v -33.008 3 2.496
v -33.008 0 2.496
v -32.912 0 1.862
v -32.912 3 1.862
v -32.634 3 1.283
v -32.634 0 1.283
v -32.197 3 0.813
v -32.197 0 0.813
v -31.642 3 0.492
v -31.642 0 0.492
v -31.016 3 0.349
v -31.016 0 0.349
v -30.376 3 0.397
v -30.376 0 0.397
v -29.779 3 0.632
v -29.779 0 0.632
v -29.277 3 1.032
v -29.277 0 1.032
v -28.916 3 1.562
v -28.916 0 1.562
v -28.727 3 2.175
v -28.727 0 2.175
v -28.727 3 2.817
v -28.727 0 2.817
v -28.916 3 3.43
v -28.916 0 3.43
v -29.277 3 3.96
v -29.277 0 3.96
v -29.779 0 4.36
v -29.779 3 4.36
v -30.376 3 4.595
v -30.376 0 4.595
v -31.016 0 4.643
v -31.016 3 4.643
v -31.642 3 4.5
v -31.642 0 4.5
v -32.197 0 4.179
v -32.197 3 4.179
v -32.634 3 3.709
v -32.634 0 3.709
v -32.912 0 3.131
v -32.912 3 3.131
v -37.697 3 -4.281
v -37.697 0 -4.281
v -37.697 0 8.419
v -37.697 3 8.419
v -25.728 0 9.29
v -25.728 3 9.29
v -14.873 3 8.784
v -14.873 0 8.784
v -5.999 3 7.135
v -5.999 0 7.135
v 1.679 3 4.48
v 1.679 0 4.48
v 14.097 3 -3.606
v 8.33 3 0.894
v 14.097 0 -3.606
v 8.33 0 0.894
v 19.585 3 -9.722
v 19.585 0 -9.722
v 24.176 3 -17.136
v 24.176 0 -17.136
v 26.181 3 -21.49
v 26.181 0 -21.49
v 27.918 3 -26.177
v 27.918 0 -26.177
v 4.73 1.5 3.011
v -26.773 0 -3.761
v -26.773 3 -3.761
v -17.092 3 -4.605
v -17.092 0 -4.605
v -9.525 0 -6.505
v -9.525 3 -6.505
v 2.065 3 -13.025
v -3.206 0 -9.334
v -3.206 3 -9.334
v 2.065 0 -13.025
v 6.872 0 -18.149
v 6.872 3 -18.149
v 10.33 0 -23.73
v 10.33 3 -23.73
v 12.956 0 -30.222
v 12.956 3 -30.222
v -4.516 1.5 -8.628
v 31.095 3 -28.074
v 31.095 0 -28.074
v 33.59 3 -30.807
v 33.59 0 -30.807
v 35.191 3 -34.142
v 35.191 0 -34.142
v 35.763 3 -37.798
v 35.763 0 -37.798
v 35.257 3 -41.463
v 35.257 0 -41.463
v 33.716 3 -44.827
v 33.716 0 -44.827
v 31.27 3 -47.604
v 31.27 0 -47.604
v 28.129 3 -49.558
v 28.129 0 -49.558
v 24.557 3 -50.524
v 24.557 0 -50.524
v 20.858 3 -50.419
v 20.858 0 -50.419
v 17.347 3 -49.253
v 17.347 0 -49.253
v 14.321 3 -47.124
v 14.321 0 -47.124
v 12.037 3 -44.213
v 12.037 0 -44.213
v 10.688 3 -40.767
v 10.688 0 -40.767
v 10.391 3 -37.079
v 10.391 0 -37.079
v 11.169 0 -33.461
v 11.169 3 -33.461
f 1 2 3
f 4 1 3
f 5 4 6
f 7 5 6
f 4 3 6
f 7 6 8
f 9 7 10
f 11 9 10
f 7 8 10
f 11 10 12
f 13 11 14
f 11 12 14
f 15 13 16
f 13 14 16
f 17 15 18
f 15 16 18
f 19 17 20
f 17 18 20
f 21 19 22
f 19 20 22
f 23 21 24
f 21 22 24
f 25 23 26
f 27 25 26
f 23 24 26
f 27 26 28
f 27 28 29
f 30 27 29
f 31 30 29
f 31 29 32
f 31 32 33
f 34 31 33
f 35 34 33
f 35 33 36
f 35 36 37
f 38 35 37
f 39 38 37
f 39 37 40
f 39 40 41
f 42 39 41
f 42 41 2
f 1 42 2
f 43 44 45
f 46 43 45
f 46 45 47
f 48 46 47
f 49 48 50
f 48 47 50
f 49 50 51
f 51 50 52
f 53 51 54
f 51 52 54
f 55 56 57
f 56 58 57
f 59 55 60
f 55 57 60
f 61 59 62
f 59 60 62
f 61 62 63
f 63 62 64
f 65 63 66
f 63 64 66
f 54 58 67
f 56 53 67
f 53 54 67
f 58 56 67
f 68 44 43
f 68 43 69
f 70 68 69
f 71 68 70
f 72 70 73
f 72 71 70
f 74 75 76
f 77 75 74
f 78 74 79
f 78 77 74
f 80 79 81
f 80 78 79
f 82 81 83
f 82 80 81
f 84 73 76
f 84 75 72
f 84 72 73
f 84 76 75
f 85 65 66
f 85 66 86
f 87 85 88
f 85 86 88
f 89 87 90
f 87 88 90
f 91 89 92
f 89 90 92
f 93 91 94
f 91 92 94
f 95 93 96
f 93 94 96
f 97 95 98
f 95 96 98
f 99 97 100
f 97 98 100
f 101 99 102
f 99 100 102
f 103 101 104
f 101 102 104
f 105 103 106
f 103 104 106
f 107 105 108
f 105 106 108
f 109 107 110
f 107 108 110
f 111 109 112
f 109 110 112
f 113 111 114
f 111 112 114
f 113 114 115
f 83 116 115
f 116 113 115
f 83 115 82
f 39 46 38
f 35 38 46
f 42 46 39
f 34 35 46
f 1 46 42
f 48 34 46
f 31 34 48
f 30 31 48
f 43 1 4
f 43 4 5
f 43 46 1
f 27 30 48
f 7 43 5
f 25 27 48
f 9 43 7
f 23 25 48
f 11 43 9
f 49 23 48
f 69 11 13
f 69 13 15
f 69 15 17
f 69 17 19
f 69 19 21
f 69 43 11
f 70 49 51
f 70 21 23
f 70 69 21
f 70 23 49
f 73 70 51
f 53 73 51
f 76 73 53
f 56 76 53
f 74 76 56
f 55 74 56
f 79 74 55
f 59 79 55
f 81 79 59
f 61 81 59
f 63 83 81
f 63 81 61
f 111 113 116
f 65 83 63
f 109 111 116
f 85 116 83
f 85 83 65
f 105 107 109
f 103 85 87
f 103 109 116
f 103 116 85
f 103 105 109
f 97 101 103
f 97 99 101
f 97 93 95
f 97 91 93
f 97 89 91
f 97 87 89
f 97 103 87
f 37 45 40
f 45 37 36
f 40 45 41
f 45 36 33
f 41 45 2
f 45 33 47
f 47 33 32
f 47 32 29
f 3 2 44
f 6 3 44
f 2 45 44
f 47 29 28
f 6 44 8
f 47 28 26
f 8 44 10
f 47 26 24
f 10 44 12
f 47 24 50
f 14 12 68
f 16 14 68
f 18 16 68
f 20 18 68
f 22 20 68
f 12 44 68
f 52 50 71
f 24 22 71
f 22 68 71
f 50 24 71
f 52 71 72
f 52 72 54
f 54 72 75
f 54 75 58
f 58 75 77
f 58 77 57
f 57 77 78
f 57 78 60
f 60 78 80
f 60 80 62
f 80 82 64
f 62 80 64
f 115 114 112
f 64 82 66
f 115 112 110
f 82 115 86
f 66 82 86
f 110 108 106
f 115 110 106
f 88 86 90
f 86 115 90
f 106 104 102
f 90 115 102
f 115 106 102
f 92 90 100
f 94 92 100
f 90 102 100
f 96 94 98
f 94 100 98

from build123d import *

# Parameters (mm, degrees)
BOSS_EXTRUDE1_DEPTH   = 3
SKETCH3_R             = 12.7
BOSS_EXTRUDE2_DEPTH   = 3
F_8_CLEARANCE_HOLE1_D = 4.3053


with BuildPart() as part:
    # Sketch2 → Boss-Extrude1 (new body)
    with BuildSketch(Plane(origin=(0, 0, 0), x_dir=(1, 0, 0), z_dir=(0, 1, 0))):
        with BuildLine():
            Line((-37.697043062, 4.281020581), (-37.697043062, -8.418979419))
            add(Edge.make_bspline(
                [(-37.697043062, -8.418979419), (17.380898097, -15.277400847), (29.368687451, 31.123681561)],
                knots=[0, 0, 0, 1, 1, 1], degree=2))
            Line((29.368687451, 31.123681561), (14.247453118, 35.062826639))
            add(Edge.make_bspline(
                [(-37.697043062, 4.281020581), (6.487978336, -0.323288205), (14.247453118, 35.062826639)],
                knots=[0, 0, 0, 1, 1, 1], degree=2))
        make_face()
    extrude(amount=BOSS_EXTRUDE1_DEPTH)

    # Sketch3 → Boss-Extrude2 (add)
    with BuildSketch(Plane(origin=(0, 0, 0), x_dir=(1, 0, 0), z_dir=(0, 1, 0))):
        with Locations((23.06337647, 37.912010101)):
            Circle(SKETCH3_R)
    extrude(amount=BOSS_EXTRUDE2_DEPTH)

    # #8 Clearance Hole1 (through all)
    with Locations(Plane(origin=(0, 3, 0), x_dir=(1, 0, 0), z_dir=(0, 1, 0))):
        with Locations((-30.855203609, -2.496063835)):
            Hole(F_8_CLEARANCE_HOLE1_D / 2)


solid = part.part
